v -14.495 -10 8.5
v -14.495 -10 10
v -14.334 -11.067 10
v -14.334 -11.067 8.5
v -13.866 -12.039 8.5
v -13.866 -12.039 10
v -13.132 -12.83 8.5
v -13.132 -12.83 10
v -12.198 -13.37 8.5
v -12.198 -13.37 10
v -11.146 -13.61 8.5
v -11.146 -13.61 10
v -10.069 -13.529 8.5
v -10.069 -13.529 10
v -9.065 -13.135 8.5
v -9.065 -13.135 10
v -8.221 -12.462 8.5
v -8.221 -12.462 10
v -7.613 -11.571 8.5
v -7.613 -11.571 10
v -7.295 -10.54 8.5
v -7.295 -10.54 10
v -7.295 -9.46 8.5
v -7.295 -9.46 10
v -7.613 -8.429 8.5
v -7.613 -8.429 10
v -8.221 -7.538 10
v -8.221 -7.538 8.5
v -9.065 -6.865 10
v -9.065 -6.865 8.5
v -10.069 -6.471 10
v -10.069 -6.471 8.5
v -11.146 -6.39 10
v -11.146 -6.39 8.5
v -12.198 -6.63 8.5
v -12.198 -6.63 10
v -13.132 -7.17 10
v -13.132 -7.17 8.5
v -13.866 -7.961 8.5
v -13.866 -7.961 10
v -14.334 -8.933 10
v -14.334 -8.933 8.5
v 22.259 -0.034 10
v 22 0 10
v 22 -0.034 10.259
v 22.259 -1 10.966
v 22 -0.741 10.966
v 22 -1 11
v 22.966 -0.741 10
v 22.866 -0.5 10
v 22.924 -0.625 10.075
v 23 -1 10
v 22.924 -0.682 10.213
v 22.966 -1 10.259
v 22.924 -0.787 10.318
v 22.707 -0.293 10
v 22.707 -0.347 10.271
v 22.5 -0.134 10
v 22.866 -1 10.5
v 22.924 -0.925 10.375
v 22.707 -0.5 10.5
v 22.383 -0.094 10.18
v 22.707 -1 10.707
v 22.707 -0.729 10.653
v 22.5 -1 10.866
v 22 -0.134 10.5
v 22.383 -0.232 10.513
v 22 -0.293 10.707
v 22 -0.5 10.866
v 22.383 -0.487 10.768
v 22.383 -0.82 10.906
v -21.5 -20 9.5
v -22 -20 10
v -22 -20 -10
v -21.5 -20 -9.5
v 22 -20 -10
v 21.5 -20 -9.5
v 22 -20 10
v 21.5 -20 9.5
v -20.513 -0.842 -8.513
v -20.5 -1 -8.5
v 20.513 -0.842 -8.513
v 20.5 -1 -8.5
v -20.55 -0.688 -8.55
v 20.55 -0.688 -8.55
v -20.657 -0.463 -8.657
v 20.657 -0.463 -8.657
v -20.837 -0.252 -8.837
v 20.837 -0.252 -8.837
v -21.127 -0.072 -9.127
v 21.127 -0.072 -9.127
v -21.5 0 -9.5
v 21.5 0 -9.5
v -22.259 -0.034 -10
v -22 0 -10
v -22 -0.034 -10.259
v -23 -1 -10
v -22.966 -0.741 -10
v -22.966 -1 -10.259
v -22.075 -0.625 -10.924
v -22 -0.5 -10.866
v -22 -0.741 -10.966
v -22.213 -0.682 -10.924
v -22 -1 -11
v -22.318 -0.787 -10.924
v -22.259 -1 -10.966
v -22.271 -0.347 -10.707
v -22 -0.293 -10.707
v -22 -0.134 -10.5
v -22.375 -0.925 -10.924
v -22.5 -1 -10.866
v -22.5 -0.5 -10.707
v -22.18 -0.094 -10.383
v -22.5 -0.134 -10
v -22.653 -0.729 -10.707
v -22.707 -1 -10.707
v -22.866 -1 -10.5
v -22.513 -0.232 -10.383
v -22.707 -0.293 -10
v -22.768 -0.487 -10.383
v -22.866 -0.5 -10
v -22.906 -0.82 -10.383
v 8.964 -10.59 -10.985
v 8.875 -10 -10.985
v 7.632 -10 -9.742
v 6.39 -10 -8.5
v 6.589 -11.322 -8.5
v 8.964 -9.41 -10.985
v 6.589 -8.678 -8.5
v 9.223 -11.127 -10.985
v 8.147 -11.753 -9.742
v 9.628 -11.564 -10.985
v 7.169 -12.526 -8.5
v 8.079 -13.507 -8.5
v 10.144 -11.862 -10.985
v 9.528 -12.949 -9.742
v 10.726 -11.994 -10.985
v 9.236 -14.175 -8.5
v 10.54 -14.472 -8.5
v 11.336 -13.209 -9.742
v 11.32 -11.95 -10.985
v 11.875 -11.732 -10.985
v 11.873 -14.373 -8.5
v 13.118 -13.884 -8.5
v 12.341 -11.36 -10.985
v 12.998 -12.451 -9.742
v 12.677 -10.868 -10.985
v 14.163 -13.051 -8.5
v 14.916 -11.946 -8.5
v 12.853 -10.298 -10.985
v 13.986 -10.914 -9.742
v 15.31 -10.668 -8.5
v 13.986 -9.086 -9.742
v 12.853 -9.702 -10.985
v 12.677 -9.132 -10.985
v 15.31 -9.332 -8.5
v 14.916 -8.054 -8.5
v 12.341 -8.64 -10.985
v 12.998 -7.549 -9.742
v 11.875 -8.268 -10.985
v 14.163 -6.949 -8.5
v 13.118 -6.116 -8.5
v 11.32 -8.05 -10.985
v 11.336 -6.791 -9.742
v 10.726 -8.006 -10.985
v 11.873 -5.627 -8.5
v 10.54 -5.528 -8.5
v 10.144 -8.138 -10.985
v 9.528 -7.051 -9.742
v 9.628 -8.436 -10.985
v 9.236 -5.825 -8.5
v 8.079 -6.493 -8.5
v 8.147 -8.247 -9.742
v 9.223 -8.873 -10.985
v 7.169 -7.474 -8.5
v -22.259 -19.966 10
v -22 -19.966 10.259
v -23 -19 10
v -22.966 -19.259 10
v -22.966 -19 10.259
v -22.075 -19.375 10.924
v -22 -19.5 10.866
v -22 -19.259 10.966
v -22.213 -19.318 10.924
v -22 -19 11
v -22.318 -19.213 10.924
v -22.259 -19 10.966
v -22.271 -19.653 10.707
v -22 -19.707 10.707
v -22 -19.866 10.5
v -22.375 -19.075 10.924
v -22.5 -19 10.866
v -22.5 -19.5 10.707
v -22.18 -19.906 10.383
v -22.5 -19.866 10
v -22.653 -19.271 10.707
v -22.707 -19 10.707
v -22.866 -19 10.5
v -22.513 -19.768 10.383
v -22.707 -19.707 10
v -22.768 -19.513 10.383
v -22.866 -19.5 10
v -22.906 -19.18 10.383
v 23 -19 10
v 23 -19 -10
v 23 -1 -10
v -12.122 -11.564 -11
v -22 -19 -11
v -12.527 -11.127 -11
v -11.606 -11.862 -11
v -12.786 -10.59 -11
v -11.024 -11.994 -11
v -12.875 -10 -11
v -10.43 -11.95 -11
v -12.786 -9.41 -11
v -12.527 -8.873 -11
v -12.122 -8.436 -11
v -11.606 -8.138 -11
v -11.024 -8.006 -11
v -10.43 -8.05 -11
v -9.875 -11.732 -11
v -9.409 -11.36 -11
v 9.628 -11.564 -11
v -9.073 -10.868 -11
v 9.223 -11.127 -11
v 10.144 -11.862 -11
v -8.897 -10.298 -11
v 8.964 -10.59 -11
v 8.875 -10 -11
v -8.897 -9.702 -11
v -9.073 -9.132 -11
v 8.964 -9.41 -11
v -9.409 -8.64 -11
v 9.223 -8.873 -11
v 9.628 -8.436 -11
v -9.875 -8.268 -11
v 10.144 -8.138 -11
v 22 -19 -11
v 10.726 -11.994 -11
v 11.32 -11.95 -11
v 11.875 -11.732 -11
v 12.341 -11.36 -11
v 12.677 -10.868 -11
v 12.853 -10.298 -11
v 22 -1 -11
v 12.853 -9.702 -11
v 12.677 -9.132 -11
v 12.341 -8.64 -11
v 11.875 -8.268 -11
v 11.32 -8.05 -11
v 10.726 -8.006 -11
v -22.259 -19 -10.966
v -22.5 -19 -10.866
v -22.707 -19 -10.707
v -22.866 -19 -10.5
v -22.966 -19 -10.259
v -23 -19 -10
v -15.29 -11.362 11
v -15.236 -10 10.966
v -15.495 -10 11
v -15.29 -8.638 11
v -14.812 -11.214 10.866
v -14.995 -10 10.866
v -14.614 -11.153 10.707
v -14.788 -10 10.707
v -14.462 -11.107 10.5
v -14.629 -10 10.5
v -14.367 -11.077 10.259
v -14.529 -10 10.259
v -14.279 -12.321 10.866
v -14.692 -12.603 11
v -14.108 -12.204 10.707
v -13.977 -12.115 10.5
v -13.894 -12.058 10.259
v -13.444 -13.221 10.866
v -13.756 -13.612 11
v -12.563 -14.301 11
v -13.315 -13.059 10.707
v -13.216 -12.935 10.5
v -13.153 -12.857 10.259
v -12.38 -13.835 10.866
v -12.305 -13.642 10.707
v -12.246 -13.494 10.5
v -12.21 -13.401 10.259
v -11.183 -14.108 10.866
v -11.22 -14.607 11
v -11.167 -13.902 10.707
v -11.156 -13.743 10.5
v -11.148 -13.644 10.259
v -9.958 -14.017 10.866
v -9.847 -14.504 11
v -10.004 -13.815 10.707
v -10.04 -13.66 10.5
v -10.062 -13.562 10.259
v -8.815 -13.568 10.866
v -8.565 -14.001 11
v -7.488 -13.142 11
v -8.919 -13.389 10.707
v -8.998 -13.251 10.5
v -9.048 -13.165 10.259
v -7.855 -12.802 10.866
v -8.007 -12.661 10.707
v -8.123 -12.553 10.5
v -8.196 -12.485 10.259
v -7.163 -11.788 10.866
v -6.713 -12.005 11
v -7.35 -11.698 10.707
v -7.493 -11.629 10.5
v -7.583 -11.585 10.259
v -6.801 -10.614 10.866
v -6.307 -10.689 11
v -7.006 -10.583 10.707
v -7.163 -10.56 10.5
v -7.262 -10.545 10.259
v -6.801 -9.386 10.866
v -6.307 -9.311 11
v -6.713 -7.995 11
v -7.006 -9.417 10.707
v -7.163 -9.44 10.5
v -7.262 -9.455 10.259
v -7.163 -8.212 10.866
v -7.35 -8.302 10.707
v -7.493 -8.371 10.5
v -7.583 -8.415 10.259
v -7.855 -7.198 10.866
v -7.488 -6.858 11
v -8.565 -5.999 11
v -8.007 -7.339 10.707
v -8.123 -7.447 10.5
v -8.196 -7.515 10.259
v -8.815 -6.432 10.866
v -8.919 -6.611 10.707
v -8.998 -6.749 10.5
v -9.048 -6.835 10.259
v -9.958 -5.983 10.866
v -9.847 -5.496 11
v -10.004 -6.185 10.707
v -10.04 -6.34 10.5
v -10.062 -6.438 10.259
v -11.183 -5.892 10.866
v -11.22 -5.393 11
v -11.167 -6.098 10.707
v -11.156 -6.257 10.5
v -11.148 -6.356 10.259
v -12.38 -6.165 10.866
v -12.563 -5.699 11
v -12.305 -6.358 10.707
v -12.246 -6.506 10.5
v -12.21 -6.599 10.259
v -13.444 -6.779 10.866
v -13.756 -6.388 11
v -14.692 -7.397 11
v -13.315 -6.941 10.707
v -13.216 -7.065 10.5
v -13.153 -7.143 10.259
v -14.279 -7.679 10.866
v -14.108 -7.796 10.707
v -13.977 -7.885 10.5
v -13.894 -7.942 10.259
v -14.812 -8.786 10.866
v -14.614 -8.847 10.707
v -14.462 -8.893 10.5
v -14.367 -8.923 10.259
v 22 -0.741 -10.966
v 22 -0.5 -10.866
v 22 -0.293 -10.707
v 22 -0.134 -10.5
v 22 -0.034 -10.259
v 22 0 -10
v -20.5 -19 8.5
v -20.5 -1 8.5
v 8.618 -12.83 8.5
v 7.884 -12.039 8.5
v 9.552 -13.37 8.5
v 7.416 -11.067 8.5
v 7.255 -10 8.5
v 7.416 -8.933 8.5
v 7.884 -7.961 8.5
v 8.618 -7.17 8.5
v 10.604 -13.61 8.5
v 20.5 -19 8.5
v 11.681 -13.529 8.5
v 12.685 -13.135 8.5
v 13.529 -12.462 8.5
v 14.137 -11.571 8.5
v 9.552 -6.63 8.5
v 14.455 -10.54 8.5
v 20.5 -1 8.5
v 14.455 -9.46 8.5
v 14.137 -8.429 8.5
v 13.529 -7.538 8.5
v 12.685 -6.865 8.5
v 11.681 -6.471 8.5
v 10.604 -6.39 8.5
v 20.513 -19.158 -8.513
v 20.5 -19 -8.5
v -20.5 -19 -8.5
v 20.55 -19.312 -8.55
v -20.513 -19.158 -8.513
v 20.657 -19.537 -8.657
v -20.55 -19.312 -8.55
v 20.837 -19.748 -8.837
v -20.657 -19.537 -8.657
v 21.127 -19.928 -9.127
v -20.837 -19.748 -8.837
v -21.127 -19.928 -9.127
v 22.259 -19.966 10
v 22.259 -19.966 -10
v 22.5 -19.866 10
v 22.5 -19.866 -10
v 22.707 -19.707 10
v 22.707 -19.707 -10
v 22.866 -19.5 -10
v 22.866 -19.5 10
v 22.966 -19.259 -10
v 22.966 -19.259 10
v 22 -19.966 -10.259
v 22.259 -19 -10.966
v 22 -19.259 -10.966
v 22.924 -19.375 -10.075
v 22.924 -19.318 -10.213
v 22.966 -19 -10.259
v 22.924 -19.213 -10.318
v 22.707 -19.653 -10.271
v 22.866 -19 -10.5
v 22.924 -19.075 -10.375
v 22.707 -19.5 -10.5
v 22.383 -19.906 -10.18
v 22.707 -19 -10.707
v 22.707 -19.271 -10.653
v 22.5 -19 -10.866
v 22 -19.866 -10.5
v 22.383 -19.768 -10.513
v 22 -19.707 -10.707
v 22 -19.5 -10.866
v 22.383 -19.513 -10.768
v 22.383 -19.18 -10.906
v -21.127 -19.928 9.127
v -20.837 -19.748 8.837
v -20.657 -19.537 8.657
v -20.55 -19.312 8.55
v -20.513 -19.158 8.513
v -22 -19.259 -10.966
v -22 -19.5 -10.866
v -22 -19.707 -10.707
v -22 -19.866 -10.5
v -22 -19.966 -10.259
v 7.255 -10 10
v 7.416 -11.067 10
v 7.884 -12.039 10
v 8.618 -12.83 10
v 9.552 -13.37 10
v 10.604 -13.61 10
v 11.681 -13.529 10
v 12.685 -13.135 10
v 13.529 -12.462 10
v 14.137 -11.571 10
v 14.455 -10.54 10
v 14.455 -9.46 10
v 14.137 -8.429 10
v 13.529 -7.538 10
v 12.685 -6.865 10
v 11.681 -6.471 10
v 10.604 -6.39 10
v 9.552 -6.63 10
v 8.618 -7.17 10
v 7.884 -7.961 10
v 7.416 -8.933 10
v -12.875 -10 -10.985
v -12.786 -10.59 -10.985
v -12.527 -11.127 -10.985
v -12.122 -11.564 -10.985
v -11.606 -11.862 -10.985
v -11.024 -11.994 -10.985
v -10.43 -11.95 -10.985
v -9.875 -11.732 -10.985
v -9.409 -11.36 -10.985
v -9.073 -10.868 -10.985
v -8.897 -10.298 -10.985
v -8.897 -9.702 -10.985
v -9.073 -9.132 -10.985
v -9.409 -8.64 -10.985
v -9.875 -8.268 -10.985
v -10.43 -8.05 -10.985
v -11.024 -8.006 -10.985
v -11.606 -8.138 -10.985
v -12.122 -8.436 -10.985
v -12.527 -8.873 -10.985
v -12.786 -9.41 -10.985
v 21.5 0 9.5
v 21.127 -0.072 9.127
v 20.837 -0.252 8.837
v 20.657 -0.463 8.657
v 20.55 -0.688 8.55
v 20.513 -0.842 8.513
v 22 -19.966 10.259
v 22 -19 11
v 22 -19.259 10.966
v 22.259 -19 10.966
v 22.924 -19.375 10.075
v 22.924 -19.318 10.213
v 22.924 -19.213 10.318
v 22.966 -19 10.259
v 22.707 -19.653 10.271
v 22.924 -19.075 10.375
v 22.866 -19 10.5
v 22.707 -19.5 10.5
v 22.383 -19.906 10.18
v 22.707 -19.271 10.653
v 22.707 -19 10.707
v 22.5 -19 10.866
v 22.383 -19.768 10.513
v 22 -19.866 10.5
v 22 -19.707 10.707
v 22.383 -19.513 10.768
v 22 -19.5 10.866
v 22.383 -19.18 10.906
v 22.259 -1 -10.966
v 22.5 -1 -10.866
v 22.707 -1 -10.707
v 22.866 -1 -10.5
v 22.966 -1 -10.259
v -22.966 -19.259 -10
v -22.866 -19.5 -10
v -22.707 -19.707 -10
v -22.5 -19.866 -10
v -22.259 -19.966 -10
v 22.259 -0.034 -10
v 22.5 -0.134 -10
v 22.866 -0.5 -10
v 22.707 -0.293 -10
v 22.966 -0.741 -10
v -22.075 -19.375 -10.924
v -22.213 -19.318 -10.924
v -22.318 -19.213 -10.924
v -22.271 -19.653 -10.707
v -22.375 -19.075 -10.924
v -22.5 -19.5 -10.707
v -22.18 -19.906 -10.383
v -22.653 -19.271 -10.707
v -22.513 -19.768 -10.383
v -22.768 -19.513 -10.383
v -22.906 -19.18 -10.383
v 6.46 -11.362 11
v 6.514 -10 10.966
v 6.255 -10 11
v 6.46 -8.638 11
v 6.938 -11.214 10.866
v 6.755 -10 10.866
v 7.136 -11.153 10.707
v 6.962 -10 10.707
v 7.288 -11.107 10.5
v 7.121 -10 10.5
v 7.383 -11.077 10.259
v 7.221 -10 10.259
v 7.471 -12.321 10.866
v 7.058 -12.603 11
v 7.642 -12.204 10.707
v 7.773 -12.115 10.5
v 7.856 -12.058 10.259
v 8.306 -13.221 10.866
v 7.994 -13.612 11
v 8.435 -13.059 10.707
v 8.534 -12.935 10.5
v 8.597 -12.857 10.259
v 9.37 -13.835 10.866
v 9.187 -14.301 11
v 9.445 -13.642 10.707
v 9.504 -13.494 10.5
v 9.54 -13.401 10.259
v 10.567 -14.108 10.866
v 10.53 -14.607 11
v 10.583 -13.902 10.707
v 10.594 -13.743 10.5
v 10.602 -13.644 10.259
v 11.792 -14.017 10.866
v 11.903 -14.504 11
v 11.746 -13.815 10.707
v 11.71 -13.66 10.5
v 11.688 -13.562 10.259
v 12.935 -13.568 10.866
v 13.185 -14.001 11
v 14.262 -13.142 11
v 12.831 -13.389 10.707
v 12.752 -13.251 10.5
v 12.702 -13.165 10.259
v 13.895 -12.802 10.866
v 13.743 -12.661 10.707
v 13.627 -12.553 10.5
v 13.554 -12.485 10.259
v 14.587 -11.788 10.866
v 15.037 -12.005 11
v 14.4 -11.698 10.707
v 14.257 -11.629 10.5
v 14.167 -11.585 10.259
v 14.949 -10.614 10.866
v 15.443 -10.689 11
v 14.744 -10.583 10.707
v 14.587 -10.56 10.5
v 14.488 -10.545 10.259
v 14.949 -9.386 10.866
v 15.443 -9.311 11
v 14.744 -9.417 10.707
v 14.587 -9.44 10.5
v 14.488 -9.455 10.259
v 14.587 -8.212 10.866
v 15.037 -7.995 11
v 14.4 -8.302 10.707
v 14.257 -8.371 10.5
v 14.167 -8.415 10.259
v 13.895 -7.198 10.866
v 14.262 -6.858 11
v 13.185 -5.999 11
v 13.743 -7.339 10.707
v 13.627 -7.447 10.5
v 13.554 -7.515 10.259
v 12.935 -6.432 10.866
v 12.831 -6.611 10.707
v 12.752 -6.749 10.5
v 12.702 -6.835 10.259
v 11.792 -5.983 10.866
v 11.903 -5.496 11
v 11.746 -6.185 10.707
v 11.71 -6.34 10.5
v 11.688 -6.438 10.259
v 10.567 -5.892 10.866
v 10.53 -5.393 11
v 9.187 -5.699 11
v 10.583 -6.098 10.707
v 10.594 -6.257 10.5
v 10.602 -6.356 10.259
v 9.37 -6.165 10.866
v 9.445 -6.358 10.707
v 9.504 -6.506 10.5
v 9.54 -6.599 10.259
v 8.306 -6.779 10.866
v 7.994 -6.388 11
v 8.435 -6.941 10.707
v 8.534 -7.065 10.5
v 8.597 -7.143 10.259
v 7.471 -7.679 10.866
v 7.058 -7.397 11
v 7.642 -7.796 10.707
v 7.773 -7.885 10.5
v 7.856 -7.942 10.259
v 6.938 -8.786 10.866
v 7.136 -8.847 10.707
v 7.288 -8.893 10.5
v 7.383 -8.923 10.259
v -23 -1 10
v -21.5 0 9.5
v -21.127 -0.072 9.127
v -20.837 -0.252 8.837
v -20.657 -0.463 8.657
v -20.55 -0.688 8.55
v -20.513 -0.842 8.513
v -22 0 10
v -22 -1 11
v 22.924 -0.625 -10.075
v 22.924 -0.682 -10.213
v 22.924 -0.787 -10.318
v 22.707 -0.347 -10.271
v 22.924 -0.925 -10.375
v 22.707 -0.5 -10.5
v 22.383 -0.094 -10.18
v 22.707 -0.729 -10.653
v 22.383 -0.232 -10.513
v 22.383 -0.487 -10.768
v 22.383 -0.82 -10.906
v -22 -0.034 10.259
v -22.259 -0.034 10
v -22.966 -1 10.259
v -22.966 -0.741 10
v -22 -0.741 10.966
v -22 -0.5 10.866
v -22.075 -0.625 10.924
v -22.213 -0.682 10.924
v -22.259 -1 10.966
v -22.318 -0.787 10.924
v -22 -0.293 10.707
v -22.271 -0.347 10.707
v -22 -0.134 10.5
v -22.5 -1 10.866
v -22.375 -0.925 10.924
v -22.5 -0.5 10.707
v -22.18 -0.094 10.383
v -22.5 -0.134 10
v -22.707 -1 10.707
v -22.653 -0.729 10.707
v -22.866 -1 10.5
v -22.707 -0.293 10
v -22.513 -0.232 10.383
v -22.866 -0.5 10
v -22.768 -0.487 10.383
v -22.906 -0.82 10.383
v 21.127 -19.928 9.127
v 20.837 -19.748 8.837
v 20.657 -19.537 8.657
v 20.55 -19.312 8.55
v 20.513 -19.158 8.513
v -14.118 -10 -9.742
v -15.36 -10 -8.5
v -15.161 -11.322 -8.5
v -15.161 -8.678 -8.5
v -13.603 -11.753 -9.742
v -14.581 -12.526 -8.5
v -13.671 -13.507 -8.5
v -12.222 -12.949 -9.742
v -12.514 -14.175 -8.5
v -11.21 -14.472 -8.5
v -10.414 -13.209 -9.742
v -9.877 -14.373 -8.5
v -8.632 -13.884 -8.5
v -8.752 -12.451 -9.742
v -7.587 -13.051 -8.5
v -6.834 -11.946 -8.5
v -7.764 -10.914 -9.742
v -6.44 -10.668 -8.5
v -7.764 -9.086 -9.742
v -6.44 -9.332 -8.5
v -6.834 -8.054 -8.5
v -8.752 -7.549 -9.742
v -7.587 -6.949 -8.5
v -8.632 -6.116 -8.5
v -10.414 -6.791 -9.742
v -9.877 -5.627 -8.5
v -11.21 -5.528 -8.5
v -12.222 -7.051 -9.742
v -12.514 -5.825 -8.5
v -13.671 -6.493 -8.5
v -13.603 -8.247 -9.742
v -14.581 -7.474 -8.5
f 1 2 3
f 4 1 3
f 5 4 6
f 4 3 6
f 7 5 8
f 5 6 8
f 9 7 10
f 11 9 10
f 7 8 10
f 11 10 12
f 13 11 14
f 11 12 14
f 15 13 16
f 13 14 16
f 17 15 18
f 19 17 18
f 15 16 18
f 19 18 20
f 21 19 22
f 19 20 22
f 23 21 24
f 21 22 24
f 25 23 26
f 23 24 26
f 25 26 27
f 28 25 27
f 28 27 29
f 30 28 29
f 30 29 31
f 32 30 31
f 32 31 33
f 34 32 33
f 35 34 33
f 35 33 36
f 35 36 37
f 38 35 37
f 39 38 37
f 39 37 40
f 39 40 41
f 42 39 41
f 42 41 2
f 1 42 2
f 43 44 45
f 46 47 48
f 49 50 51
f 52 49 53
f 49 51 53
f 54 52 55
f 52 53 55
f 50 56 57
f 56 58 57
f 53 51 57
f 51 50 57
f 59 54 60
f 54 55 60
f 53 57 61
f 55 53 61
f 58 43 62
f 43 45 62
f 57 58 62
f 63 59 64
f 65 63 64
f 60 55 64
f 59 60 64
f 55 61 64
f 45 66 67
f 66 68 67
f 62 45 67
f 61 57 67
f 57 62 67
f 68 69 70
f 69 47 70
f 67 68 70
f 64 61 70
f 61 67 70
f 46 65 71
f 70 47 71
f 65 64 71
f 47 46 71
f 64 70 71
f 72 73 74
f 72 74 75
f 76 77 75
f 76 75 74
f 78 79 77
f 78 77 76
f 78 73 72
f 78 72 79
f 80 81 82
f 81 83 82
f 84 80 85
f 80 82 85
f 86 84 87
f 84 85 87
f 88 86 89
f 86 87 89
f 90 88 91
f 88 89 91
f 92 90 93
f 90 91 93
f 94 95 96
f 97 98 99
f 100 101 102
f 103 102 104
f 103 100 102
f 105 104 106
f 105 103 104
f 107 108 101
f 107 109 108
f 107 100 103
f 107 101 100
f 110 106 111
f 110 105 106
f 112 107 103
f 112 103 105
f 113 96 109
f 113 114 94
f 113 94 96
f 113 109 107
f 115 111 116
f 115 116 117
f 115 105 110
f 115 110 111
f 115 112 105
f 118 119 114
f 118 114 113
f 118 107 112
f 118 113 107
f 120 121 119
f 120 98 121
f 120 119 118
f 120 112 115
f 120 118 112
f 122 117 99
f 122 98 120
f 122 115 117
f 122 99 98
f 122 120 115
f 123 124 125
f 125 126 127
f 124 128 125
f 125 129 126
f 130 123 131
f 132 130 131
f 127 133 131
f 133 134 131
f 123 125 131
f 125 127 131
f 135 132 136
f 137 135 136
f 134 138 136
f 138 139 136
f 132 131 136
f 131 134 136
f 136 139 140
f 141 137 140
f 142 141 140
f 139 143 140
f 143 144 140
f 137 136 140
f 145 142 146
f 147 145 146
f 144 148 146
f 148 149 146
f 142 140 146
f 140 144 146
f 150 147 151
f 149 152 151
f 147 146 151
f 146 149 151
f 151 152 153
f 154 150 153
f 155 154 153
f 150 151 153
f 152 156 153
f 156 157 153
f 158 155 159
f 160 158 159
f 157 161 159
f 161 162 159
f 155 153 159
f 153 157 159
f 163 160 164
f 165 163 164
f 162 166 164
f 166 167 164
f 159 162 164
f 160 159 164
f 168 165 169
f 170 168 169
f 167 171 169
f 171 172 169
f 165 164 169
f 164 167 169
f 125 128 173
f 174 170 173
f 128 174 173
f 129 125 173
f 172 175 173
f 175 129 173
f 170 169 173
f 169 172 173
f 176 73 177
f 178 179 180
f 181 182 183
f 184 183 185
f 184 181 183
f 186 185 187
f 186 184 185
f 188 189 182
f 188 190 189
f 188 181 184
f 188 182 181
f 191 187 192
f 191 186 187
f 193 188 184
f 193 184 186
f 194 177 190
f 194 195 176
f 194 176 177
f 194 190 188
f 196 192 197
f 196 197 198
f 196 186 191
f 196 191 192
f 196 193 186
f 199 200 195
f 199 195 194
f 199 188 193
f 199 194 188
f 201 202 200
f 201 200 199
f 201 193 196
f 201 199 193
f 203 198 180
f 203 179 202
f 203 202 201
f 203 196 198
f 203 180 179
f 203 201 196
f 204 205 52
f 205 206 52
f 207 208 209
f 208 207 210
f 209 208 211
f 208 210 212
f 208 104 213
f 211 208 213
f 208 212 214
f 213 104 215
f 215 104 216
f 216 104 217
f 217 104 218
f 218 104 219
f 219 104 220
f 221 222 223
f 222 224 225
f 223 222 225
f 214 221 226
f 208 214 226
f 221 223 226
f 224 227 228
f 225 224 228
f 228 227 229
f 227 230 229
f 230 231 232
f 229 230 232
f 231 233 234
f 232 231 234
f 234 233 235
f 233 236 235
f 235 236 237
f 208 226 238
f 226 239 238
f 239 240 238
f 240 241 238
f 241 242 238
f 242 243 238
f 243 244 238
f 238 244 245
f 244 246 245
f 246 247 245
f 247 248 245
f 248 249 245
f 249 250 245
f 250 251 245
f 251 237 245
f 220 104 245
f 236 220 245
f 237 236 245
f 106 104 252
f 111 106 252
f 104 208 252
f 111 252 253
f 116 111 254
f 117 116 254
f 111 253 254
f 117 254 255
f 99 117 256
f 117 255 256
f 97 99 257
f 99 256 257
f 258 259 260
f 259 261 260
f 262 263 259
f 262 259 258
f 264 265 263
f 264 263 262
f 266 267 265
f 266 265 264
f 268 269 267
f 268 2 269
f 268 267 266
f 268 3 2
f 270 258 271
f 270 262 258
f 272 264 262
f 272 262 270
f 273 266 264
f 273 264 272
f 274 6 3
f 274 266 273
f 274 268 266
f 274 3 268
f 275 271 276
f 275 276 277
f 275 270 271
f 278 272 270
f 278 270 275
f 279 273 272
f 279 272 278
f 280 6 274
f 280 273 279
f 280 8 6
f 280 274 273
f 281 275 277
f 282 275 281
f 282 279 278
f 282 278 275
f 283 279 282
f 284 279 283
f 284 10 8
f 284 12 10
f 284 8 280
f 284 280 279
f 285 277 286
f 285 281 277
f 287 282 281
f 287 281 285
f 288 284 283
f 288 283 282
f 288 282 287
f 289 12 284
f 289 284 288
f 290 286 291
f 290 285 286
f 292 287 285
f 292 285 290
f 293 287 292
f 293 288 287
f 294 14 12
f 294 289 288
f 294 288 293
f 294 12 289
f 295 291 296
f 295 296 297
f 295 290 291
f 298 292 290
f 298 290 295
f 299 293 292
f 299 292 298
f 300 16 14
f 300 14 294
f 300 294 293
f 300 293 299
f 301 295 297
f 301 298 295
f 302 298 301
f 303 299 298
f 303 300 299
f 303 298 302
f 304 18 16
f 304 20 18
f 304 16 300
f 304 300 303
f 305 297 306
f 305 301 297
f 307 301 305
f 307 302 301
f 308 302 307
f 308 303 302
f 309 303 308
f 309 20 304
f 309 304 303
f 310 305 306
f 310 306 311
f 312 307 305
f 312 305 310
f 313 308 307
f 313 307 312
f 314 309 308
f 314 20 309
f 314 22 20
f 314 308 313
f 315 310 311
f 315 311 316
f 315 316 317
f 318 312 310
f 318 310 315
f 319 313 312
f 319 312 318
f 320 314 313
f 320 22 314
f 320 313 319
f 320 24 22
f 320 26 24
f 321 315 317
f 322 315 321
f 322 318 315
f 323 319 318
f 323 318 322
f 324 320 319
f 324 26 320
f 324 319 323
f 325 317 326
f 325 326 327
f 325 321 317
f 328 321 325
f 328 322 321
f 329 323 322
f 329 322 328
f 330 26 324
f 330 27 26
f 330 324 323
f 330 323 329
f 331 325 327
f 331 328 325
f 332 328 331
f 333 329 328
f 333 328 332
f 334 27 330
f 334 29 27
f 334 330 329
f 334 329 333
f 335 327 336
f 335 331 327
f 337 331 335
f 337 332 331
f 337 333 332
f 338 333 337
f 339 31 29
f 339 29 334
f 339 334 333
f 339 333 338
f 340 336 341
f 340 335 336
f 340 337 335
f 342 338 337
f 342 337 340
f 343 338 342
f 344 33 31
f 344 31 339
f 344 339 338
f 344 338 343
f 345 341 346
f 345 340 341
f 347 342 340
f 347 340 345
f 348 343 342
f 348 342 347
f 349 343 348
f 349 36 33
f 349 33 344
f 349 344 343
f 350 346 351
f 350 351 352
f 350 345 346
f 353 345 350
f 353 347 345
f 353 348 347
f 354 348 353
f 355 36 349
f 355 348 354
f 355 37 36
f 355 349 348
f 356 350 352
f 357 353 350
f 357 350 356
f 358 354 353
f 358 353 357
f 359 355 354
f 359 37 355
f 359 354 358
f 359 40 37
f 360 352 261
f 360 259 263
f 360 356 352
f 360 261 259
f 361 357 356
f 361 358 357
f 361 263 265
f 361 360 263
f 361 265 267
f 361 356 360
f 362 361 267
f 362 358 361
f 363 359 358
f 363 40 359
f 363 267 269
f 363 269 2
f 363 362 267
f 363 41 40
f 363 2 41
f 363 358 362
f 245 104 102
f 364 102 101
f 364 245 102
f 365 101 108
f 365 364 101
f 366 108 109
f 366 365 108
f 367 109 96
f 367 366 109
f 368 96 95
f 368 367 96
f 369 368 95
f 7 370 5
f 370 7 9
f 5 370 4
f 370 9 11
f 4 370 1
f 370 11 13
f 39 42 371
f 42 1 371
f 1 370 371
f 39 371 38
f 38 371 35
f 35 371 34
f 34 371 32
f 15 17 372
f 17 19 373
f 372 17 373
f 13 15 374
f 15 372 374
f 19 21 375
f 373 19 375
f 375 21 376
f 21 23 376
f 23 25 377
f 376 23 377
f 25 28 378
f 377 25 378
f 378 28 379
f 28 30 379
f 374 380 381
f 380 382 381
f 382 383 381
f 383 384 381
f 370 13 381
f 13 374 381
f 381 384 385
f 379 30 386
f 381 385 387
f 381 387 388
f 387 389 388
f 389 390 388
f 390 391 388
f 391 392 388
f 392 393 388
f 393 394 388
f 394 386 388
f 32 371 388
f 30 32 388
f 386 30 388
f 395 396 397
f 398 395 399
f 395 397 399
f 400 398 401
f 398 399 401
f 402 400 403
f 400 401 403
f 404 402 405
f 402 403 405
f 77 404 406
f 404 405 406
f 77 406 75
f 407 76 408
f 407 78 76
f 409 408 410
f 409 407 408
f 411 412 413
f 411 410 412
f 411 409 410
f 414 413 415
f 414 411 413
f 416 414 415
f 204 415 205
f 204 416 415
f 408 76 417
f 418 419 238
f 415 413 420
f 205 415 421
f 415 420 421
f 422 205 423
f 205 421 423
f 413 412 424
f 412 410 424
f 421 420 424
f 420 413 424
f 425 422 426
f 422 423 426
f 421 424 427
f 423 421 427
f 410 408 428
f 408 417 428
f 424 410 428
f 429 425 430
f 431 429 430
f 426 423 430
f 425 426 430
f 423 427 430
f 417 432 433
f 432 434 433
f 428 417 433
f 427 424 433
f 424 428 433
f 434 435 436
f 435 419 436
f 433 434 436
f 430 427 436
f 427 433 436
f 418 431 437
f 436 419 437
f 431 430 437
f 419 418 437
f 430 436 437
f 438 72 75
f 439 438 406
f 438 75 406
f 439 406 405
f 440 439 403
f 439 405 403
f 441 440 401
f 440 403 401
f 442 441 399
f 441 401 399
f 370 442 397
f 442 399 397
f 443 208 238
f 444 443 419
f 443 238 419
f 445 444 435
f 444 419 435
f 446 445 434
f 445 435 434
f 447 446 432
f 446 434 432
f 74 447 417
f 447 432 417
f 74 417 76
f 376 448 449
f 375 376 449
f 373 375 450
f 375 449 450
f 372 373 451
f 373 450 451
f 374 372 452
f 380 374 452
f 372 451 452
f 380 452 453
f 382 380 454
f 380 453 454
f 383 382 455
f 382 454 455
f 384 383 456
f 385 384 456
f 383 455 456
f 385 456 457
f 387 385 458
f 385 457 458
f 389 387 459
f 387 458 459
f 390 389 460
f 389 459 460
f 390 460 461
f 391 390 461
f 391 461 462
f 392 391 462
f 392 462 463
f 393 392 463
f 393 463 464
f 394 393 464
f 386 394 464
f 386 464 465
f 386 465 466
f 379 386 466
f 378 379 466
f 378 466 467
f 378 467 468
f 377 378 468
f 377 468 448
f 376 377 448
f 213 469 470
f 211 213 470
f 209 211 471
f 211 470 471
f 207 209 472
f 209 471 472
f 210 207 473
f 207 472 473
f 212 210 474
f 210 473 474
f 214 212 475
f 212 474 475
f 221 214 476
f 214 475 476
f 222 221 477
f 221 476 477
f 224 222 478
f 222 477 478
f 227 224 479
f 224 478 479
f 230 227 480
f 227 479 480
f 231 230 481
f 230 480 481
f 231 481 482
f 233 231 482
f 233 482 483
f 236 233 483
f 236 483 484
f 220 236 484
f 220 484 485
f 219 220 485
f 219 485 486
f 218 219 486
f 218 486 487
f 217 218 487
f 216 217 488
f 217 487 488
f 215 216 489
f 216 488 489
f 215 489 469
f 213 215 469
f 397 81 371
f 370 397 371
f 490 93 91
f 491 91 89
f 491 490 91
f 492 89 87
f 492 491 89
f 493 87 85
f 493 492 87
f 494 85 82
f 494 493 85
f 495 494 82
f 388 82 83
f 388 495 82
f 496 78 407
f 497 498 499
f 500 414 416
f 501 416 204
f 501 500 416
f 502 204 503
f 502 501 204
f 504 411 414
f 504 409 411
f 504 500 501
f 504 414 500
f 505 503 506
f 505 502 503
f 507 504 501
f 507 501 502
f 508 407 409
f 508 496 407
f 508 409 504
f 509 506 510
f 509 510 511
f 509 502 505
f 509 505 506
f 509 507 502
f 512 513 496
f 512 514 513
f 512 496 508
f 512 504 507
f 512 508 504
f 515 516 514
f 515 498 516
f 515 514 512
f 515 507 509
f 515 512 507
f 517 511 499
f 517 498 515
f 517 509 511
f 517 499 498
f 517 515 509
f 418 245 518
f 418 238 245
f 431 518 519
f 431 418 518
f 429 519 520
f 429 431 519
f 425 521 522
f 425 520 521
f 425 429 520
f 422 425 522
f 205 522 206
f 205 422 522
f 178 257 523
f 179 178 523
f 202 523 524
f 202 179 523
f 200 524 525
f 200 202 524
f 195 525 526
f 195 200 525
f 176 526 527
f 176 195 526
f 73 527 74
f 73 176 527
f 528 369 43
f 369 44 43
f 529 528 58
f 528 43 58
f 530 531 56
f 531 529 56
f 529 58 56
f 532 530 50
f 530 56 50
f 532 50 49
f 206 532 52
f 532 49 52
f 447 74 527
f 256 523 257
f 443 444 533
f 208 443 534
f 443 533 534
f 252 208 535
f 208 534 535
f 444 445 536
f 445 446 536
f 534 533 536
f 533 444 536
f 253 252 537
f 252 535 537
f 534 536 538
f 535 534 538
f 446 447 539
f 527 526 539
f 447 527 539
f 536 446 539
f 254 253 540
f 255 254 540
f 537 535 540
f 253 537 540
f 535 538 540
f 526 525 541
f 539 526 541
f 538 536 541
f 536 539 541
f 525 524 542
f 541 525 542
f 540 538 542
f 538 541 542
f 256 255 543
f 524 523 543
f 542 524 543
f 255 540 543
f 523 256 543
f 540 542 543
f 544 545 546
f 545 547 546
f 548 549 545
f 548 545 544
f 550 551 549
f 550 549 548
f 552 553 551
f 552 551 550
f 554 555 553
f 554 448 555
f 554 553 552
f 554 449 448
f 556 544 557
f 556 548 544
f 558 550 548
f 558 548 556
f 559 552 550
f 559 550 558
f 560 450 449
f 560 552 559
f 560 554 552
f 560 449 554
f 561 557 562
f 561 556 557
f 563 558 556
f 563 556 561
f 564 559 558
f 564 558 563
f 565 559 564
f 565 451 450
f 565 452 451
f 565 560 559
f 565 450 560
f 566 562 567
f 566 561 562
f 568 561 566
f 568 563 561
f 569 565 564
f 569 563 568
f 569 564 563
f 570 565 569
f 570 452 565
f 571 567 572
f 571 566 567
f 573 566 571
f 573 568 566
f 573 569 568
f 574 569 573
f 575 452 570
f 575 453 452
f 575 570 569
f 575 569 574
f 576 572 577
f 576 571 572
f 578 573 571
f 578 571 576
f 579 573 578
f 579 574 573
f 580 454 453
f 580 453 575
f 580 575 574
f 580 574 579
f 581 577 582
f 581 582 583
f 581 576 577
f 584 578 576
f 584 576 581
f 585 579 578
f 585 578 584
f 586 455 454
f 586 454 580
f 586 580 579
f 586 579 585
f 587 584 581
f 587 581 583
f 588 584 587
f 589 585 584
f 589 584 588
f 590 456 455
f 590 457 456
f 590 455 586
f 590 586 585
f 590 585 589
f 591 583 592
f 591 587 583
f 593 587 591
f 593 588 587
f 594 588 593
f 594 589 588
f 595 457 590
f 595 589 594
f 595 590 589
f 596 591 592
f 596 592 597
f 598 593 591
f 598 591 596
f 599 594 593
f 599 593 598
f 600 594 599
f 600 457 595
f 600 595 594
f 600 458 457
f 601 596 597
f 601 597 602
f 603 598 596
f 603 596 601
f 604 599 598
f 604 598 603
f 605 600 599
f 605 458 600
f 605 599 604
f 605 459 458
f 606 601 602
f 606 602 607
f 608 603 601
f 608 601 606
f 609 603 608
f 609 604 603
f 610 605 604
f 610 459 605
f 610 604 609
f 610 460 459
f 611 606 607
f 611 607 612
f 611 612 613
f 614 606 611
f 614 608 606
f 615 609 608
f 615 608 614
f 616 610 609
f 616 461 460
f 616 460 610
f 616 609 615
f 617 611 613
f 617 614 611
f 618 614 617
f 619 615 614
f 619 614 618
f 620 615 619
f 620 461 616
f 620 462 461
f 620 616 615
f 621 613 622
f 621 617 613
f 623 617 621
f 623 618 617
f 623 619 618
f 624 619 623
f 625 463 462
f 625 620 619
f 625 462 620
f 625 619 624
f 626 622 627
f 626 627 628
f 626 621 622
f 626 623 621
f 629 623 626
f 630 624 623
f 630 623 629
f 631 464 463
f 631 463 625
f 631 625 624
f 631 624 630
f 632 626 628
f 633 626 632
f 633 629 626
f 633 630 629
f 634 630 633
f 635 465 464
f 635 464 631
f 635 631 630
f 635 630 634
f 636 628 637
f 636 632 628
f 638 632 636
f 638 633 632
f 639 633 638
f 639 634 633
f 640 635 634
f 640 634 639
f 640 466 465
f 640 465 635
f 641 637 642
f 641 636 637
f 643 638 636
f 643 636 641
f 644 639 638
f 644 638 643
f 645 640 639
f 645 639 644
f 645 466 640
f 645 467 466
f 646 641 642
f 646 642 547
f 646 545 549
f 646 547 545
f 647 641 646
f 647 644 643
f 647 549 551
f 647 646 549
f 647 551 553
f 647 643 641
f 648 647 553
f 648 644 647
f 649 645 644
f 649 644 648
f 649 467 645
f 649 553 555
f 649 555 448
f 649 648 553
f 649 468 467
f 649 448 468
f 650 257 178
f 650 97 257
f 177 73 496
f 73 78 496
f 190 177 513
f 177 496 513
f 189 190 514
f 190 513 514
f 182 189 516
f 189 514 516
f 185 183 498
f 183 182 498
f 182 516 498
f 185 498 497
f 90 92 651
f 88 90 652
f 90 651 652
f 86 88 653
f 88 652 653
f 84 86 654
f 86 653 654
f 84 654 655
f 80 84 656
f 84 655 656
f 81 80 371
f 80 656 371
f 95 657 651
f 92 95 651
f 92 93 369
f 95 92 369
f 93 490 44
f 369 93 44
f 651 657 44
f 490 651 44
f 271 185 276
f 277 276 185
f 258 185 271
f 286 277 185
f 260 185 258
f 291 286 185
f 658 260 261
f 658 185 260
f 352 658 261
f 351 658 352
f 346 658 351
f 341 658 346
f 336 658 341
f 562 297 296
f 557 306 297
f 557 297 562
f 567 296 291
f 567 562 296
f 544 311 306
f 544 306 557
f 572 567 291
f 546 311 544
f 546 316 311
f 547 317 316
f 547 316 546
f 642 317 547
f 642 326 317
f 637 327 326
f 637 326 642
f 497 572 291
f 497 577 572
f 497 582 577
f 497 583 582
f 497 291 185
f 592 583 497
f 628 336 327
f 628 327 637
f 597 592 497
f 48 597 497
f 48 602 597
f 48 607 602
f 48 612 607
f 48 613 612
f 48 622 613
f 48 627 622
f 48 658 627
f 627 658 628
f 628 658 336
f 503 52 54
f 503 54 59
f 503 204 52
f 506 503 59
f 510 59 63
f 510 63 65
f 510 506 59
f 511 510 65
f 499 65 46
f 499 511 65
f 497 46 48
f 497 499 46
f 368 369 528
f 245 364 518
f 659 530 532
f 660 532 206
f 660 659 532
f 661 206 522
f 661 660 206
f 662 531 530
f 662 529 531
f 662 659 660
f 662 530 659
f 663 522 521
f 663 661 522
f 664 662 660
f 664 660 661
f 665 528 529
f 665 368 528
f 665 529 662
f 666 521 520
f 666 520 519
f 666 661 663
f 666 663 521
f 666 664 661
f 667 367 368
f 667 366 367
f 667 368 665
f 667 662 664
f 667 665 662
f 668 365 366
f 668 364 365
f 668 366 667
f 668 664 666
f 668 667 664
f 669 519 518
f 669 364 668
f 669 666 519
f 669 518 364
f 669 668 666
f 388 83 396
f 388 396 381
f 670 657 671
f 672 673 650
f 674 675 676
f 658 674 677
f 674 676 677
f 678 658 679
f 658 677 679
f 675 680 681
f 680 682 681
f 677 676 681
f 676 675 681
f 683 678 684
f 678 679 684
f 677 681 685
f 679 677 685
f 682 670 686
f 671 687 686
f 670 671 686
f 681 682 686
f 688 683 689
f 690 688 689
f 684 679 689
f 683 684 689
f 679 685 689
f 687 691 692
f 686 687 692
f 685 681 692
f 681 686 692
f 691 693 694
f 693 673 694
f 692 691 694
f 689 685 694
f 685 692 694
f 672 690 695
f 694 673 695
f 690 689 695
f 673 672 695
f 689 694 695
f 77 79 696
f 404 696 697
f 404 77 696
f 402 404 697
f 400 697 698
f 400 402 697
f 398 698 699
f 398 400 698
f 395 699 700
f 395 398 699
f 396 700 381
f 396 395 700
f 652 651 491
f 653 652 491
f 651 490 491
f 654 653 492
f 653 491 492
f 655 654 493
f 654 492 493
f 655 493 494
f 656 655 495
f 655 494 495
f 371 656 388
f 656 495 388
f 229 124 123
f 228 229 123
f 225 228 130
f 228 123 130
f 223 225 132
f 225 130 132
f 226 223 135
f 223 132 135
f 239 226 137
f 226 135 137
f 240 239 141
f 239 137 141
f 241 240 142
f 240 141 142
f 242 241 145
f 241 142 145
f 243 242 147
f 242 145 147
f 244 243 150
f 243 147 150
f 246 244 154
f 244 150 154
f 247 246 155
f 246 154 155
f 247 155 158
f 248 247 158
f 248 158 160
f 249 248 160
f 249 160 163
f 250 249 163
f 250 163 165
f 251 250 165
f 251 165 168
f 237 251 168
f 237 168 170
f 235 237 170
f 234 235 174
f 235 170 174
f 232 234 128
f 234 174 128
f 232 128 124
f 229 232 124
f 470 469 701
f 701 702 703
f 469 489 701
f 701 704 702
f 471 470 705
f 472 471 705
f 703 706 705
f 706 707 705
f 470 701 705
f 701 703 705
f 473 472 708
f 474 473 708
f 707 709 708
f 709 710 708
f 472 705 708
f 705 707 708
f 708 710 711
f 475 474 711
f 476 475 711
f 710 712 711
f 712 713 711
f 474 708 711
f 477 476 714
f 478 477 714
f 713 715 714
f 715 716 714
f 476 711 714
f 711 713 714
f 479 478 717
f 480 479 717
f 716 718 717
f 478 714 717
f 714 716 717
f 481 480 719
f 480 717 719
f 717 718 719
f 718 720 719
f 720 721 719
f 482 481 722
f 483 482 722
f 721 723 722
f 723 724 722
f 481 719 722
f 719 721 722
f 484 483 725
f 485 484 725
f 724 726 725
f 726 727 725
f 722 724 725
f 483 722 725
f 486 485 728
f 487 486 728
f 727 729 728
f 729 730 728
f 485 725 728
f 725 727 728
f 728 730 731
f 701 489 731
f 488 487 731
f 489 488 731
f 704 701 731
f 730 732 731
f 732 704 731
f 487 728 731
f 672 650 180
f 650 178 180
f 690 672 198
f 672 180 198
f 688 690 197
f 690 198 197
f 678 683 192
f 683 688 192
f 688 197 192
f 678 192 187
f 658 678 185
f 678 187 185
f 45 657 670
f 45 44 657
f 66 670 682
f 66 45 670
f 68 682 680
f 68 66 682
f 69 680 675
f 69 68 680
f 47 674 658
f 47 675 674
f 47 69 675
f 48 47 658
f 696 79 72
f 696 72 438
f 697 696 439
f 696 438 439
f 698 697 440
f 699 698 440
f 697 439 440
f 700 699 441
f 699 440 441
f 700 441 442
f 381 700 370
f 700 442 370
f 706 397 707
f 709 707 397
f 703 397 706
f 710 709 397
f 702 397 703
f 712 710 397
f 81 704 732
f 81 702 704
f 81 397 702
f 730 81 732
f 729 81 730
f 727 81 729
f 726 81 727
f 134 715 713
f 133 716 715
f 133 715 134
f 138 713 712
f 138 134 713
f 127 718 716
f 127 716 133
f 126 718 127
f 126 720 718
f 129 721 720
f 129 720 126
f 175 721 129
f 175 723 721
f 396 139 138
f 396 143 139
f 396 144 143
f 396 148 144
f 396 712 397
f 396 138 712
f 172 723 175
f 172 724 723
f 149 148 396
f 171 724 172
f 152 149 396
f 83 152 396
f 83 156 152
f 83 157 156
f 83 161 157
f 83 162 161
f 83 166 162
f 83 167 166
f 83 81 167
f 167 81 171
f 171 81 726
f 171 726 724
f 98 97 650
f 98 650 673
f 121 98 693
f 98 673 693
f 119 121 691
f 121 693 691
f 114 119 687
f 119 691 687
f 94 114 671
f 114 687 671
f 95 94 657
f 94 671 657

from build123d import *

# Parameters (mm, degrees)
SKETCH_W          = 46
SKETCH_H          = 22
PAD_DEPTH         = 20
SKETCH001_W       = 41
SKETCH001_H       = 17
POCKET_DEPTH      = 0.001
POCKET_DEPTH_BACK = 20.001
SKETCH002_R       = 3.62
POCKET001_DEPTH   = 3.5
SKETCH003_R       = 2
POCKET002_DEPTH   = 2.5
CHAMFER_SIZE      = 2.485
FILLET_R          = 1


with BuildPart() as part:
    # Sketch → Pad (new body)
    with BuildSketch(Plane.XZ):
        Rectangle(SKETCH_W, SKETCH_H)
    extrude(amount=PAD_DEPTH)

    # Sketch001 → Pocket (cut, two sides)
    with BuildSketch(Plane.XZ) as pocket_sk:
        Rectangle(SKETCH001_W, SKETCH001_H)
    extrude(amount=-POCKET_DEPTH, mode=Mode.SUBTRACT)
    extrude(pocket_sk.sketch, amount=POCKET_DEPTH_BACK, mode=Mode.SUBTRACT)

    # Sketch002 (on DatumPlane) → Pocket001 (cut)
    with BuildSketch(Plane(origin=(0, 0, 11), x_dir=(-1, 0, 0), z_dir=(0, 0, 1))):
        with Locations((-10.875, 10)):
            Circle(SKETCH002_R)
        with Locations((10.875, 10)):
            Circle(SKETCH002_R)
    extrude(amount=-POCKET001_DEPTH, mode=Mode.SUBTRACT)

    # Sketch003 (on DatumPlane) → Pocket002 (cut)
    with BuildSketch(Plane(origin=(0, 0, -8.5), x_dir=(-1, 0, 0), z_dir=(0, 0, 1))):
        with Locations((-10.875, 10)):
            Circle(SKETCH003_R)
        with Locations((10.875, 10)):
            Circle(SKETCH003_R)
    extrude(amount=-POCKET002_DEPTH, mode=Mode.SUBTRACT)

    # Chamfer
    chamfer_edges = [part.edges().sort_by_distance(p)[0] for p in [
        (-8.875, -10, -8.5),
        (12.875, -10, -8.5),
    ]]
    chamfer(chamfer_edges, length=CHAMFER_SIZE)

    # Fillet
    fillet_edges = [part.edges().sort_by_distance(p)[0] for p in [
        (-23, -20, 0),
        (0, -20, 11),
        (0, -20, -11),
        (23, -20, 0),
        (-20.5, -20, 0),
        (0, -20, 8.5),
        (20.5, -20, 0),
        (0, -20, -8.5),
        (-23, 0, 0),
        (0, 0, 11),
        (0, 0, -11),
        (23, 0, 0),
        (-20.5, 0, 0),
        (0, 0, 8.5),
        (20.5, 0, 0),
        (0, 0, -8.5),
        (23, -10, 11),
        (23, -10, -11),
        (-23, -10, -11),
        (-23, -10, 11),
        (-7.255, -10, 11),
        (14.495, -10, 11),
    ]]
    fillet(fillet_edges, radius=FILLET_R)


solid = part.part
